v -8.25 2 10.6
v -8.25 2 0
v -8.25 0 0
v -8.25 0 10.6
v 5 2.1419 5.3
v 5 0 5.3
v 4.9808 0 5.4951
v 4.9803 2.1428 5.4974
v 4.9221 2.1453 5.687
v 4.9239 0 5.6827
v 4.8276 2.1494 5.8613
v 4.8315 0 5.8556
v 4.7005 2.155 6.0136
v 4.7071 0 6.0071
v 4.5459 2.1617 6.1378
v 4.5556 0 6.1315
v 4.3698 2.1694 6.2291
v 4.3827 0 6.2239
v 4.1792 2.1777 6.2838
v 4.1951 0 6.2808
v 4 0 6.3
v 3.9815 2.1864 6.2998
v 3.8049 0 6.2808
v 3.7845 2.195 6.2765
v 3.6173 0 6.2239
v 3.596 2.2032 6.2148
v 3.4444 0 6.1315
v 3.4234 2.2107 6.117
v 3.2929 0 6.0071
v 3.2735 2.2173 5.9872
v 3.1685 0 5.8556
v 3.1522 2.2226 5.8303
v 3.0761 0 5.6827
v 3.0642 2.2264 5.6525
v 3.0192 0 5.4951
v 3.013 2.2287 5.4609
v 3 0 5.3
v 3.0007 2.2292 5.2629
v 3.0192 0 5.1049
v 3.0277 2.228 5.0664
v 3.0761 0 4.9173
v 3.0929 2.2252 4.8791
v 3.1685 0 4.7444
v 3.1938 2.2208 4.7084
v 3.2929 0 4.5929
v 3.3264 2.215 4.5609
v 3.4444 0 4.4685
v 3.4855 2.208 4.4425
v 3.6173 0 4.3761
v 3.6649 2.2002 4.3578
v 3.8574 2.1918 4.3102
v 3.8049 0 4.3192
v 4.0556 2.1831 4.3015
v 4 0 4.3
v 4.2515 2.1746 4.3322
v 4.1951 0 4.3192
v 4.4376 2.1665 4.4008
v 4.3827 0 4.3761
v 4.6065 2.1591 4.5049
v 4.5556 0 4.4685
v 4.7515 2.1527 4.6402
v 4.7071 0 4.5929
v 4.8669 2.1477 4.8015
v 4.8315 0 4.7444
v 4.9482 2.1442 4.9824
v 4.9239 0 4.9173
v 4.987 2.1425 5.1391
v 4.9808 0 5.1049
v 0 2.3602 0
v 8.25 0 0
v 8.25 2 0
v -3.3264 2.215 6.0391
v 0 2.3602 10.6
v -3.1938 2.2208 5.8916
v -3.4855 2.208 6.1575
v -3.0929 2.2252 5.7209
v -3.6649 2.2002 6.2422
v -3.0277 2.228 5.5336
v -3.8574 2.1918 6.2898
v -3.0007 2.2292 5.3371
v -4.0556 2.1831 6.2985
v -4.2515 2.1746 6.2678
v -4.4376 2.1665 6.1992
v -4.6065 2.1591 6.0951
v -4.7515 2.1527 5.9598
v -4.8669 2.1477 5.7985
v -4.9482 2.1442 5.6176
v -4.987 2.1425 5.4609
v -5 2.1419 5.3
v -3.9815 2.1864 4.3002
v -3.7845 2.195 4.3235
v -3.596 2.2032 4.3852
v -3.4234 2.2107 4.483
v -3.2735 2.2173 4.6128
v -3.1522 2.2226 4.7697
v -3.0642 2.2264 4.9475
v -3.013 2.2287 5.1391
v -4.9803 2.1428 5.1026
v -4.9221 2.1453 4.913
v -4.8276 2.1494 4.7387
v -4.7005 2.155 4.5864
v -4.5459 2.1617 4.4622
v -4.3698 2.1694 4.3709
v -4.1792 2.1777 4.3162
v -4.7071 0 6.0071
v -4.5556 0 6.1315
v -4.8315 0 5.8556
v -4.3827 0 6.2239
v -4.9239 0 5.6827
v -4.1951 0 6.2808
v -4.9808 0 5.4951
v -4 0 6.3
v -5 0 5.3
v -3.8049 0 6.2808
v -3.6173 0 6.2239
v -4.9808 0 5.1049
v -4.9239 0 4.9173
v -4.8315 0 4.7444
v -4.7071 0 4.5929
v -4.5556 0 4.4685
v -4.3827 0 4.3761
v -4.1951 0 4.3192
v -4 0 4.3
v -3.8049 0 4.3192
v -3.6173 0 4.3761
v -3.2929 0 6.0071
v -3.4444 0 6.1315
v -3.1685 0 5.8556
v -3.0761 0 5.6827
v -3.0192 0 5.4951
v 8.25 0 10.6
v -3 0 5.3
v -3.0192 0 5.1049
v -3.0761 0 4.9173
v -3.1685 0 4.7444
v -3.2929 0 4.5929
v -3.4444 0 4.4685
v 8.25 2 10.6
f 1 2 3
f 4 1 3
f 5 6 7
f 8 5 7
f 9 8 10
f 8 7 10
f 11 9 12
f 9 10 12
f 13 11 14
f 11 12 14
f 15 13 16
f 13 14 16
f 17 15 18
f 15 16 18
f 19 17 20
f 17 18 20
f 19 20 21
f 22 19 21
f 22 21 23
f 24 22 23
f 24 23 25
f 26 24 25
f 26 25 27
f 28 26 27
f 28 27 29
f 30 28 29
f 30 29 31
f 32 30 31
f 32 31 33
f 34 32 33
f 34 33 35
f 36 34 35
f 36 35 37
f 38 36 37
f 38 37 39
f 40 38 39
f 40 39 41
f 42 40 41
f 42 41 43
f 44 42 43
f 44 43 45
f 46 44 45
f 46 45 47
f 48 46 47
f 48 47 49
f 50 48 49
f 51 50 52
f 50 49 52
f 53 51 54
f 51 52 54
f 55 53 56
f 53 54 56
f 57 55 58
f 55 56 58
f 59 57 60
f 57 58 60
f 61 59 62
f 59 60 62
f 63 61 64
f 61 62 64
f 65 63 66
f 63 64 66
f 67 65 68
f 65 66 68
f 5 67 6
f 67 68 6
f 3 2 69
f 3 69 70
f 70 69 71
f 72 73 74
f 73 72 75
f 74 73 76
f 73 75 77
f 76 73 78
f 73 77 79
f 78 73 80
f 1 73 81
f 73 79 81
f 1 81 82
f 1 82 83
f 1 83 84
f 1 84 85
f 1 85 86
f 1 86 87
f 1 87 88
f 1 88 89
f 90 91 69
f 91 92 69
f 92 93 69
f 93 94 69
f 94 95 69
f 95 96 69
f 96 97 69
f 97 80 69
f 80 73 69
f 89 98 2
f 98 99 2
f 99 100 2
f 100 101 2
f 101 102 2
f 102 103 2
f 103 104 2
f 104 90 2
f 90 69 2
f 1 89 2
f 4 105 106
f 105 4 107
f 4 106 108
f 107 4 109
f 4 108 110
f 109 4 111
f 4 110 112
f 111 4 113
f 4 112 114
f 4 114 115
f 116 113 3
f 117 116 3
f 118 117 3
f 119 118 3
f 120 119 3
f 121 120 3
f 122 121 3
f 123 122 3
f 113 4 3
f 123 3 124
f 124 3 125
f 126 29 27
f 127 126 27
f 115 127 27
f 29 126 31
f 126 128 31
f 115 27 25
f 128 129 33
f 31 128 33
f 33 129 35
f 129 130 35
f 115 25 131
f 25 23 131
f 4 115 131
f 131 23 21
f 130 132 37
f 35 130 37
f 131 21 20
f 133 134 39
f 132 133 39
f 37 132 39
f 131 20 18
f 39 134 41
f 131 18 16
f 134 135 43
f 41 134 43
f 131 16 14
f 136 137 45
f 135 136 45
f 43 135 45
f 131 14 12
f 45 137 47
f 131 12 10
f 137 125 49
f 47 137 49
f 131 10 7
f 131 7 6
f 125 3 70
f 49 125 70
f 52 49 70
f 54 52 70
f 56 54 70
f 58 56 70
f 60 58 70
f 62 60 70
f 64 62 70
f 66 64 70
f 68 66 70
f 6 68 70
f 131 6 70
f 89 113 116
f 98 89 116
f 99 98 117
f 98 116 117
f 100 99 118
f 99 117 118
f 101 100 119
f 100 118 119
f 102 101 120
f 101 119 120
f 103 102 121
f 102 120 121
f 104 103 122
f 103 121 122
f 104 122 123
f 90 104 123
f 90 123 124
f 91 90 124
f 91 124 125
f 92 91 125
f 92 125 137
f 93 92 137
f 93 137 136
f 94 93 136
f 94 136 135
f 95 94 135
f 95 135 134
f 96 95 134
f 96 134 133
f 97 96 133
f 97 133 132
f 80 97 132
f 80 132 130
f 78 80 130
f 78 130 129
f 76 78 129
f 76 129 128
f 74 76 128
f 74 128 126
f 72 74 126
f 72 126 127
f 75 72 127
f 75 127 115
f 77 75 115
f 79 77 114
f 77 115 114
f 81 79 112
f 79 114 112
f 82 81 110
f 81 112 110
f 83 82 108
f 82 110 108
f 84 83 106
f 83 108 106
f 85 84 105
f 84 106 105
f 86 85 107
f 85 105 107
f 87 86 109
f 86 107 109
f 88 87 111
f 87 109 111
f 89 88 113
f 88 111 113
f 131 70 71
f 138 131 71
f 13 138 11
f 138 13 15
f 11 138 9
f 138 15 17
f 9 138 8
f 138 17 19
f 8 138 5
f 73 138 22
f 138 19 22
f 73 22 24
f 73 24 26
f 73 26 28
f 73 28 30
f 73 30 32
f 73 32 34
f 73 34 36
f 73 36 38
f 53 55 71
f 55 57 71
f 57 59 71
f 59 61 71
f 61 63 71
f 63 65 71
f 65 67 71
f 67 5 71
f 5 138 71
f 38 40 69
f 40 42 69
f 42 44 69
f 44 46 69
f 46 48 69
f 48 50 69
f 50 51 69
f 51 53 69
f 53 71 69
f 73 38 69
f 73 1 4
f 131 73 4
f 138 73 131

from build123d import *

# Parameters (mm, degrees)
EXTRUDE_1_DEPTH     = 10.6
SKETCH_2_R          = 1
CUT_EXTRUDE_1_DEPTH = 14.637927158


with BuildPart() as part:
    # 草图1 → 凸台-拉伸1 (new body)
    with BuildSketch(Plane.XY):
        Polygon((-8.25, 0), (8.25, 0), (8.25, 2), (0, 2.360202779), (-8.25, 2), align=None)
    extrude(amount=EXTRUDE_1_DEPTH)

    # 草图2 → 切除-拉伸1 (cut, through all)
    with BuildSketch(Plane.XZ):
        with Locations((4, 5.3)):
            Circle(SKETCH_2_R)
        with Locations(Location((-4, 5.3, 0), (0, 0, 180))):
            Circle(SKETCH_2_R)
    extrude(amount=-CUT_EXTRUDE_1_DEPTH, mode=Mode.SUBTRACT)


solid = part.part
